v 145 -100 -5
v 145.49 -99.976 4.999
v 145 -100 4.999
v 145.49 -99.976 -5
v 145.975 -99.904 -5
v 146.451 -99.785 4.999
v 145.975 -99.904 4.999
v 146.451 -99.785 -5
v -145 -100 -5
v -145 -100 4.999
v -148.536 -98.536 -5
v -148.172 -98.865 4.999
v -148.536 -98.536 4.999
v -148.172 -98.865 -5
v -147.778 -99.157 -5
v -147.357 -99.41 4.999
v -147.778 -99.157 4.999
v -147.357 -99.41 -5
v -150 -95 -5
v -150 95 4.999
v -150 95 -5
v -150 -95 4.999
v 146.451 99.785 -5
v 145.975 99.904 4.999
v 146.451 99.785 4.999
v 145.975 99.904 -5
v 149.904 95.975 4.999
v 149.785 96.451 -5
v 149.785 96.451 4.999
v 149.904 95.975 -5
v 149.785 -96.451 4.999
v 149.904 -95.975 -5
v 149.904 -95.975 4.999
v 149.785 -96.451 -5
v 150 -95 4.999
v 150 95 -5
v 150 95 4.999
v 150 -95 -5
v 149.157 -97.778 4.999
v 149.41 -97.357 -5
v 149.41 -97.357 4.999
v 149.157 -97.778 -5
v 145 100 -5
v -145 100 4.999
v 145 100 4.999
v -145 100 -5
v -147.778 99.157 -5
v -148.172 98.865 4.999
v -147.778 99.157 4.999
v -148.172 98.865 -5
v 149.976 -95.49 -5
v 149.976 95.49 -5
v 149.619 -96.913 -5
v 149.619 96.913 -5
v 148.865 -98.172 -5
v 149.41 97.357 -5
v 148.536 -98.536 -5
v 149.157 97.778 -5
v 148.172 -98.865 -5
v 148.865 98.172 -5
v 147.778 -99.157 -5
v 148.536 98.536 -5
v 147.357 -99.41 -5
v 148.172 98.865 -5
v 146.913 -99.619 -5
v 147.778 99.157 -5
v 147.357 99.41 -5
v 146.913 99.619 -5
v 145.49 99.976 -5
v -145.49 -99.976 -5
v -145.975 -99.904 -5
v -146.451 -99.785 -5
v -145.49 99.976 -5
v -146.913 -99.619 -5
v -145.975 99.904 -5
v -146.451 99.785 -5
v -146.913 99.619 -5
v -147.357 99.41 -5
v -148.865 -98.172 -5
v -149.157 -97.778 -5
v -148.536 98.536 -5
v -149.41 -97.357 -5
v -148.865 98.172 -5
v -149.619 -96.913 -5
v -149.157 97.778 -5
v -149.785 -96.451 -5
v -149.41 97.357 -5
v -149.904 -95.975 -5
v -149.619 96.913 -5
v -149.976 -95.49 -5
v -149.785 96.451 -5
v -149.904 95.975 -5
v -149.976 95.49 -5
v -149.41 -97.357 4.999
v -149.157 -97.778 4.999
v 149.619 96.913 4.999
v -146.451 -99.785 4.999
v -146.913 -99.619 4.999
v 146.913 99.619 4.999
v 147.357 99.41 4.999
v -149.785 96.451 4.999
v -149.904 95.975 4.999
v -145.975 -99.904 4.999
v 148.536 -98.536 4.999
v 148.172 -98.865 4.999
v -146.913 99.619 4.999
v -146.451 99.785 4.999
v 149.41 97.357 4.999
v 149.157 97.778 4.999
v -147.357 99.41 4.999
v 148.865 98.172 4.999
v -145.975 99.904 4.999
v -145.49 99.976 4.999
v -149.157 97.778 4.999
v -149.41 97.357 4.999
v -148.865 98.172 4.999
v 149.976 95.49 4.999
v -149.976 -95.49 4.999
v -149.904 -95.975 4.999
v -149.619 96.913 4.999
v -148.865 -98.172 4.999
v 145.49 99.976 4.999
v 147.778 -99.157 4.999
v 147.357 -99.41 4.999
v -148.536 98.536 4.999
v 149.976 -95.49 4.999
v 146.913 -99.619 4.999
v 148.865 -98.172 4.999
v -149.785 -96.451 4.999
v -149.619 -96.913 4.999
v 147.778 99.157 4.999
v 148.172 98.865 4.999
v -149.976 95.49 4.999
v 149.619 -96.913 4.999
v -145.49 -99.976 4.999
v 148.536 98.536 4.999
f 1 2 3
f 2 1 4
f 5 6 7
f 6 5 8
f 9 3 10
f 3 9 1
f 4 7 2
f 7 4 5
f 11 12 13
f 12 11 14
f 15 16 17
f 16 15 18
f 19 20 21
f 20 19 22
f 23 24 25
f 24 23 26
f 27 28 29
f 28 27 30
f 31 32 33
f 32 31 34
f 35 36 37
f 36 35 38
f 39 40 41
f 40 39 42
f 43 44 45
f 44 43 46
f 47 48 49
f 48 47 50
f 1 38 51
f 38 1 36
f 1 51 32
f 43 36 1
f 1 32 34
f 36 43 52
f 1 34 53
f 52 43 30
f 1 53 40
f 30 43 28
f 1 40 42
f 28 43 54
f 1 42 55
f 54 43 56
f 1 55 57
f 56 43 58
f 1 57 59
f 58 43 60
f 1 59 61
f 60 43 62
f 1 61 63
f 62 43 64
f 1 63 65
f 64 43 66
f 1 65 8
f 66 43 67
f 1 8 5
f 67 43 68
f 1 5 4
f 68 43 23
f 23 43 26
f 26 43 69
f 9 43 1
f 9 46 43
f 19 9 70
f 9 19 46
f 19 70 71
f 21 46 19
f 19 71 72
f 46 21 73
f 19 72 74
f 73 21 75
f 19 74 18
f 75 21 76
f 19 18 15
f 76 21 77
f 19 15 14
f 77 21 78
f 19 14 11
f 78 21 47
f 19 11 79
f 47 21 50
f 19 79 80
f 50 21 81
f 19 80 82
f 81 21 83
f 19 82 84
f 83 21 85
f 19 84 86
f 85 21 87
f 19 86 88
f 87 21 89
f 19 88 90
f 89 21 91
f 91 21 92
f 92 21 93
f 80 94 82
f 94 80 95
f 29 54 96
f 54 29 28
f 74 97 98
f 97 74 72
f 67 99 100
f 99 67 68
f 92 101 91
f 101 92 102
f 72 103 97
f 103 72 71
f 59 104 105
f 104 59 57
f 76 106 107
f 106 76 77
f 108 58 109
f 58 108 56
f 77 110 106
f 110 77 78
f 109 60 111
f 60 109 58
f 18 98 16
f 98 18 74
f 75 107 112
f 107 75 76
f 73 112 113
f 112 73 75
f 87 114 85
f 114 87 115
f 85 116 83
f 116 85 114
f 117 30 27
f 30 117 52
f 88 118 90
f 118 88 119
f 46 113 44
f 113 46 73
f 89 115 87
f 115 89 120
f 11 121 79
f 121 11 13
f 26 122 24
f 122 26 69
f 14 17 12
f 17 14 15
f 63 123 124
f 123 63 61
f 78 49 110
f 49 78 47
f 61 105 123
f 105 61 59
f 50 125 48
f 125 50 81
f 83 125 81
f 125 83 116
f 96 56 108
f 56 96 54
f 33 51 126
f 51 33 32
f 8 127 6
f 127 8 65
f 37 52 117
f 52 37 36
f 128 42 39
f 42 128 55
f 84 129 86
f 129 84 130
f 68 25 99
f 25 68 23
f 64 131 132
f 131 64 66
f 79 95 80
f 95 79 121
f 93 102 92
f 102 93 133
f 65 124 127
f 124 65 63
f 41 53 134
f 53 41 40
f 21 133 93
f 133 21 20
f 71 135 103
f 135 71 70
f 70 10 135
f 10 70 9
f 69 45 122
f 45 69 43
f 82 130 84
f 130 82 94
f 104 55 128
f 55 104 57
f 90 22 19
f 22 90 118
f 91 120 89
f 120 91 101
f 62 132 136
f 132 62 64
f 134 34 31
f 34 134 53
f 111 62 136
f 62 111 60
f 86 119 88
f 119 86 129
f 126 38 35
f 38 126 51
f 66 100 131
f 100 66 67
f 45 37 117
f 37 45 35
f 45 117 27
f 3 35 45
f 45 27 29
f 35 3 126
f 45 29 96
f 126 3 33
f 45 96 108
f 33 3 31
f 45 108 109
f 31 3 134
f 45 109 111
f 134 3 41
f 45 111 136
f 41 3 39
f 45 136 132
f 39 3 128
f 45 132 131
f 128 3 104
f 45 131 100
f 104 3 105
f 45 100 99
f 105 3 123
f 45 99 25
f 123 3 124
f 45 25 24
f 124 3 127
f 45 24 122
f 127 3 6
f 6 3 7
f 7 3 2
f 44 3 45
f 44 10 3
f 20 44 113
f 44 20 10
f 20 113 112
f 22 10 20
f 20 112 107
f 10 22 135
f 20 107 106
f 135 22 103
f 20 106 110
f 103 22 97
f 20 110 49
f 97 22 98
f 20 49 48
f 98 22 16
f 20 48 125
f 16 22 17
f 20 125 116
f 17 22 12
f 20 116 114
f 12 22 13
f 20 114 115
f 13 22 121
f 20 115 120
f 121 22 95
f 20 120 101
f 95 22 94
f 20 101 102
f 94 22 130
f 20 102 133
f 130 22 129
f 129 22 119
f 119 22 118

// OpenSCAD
// Aluminium tooling plate (single connected solid)

// Parameters
plate_length = 300; //[150:600:1]
plate_width  = 200; //[100:400:1]
plate_thickness = 10; //[5:20:1]
edge_chamfer_size = 1; //[0.5:4:0.5]
corner_radius_value = 5; //[2:15:1]

// Quality
$fn = 64;

// Helpers
function clamp(v, lo, hi) = v < lo ? lo : (v > hi ? hi : v);

// Main plate with rounded corners and optional edge chamfer
module tooling_plate_complete() {
    // Ensure parameters are valid and cannot erase the whole part
    chamfer = clamp(edge_chamfer_size, 0, min(plate_thickness/2 - 0.01, min(plate_length, plate_width)/4));
    r = clamp(corner_radius_value, 0, min(plate_length, plate_width)/2 - 0.01);

    // 2D rounded rectangle
    module rounded_rect_2d(L, W, R) {
        if (R <= 0)
            square([L, W], center=true);
        else
            offset(r=R) square([L - 2*R, W - 2*R], center=true);
    }

    // Base solid (extruded rounded rectangle)
    module base_solid() {
        linear_extrude(height=plate_thickness, center=true, convexity=10)
            rounded_rect_2d(plate_length, plate_width, r);
    }

    // Chamfer by subtracting a slightly larger, slightly taller copy (minkowski with a cone)
    // This creates a bevel around all outer edges while keeping one connected solid.
    if (chamfer <= 0) {
        color("Silver") base_solid();
    } else {
        color("Silver")
        difference() {
            base_solid();

            // Subtract chamfer volume: expanded outline + cone creates sloped cut
            // Translate is formula-based: align to top face with a tiny overlap.
            translate([0, 0, plate_thickness/2 - 0.001])
                minkowski() {
                    // Expanded 2D outline extruded a tiny amount
                    linear_extrude(height=0.002, center=false, convexity=10)
                        rounded_rect_2d(plate_length, plate_width, r);

                    // Cone defines chamfer slope (height = chamfer, radius = chamfer)
                    cylinder(h=chamfer + 0.002, r1=chamfer, r2=0);
                }
        }
    }
}

// Render
tooling_plate_complete();
